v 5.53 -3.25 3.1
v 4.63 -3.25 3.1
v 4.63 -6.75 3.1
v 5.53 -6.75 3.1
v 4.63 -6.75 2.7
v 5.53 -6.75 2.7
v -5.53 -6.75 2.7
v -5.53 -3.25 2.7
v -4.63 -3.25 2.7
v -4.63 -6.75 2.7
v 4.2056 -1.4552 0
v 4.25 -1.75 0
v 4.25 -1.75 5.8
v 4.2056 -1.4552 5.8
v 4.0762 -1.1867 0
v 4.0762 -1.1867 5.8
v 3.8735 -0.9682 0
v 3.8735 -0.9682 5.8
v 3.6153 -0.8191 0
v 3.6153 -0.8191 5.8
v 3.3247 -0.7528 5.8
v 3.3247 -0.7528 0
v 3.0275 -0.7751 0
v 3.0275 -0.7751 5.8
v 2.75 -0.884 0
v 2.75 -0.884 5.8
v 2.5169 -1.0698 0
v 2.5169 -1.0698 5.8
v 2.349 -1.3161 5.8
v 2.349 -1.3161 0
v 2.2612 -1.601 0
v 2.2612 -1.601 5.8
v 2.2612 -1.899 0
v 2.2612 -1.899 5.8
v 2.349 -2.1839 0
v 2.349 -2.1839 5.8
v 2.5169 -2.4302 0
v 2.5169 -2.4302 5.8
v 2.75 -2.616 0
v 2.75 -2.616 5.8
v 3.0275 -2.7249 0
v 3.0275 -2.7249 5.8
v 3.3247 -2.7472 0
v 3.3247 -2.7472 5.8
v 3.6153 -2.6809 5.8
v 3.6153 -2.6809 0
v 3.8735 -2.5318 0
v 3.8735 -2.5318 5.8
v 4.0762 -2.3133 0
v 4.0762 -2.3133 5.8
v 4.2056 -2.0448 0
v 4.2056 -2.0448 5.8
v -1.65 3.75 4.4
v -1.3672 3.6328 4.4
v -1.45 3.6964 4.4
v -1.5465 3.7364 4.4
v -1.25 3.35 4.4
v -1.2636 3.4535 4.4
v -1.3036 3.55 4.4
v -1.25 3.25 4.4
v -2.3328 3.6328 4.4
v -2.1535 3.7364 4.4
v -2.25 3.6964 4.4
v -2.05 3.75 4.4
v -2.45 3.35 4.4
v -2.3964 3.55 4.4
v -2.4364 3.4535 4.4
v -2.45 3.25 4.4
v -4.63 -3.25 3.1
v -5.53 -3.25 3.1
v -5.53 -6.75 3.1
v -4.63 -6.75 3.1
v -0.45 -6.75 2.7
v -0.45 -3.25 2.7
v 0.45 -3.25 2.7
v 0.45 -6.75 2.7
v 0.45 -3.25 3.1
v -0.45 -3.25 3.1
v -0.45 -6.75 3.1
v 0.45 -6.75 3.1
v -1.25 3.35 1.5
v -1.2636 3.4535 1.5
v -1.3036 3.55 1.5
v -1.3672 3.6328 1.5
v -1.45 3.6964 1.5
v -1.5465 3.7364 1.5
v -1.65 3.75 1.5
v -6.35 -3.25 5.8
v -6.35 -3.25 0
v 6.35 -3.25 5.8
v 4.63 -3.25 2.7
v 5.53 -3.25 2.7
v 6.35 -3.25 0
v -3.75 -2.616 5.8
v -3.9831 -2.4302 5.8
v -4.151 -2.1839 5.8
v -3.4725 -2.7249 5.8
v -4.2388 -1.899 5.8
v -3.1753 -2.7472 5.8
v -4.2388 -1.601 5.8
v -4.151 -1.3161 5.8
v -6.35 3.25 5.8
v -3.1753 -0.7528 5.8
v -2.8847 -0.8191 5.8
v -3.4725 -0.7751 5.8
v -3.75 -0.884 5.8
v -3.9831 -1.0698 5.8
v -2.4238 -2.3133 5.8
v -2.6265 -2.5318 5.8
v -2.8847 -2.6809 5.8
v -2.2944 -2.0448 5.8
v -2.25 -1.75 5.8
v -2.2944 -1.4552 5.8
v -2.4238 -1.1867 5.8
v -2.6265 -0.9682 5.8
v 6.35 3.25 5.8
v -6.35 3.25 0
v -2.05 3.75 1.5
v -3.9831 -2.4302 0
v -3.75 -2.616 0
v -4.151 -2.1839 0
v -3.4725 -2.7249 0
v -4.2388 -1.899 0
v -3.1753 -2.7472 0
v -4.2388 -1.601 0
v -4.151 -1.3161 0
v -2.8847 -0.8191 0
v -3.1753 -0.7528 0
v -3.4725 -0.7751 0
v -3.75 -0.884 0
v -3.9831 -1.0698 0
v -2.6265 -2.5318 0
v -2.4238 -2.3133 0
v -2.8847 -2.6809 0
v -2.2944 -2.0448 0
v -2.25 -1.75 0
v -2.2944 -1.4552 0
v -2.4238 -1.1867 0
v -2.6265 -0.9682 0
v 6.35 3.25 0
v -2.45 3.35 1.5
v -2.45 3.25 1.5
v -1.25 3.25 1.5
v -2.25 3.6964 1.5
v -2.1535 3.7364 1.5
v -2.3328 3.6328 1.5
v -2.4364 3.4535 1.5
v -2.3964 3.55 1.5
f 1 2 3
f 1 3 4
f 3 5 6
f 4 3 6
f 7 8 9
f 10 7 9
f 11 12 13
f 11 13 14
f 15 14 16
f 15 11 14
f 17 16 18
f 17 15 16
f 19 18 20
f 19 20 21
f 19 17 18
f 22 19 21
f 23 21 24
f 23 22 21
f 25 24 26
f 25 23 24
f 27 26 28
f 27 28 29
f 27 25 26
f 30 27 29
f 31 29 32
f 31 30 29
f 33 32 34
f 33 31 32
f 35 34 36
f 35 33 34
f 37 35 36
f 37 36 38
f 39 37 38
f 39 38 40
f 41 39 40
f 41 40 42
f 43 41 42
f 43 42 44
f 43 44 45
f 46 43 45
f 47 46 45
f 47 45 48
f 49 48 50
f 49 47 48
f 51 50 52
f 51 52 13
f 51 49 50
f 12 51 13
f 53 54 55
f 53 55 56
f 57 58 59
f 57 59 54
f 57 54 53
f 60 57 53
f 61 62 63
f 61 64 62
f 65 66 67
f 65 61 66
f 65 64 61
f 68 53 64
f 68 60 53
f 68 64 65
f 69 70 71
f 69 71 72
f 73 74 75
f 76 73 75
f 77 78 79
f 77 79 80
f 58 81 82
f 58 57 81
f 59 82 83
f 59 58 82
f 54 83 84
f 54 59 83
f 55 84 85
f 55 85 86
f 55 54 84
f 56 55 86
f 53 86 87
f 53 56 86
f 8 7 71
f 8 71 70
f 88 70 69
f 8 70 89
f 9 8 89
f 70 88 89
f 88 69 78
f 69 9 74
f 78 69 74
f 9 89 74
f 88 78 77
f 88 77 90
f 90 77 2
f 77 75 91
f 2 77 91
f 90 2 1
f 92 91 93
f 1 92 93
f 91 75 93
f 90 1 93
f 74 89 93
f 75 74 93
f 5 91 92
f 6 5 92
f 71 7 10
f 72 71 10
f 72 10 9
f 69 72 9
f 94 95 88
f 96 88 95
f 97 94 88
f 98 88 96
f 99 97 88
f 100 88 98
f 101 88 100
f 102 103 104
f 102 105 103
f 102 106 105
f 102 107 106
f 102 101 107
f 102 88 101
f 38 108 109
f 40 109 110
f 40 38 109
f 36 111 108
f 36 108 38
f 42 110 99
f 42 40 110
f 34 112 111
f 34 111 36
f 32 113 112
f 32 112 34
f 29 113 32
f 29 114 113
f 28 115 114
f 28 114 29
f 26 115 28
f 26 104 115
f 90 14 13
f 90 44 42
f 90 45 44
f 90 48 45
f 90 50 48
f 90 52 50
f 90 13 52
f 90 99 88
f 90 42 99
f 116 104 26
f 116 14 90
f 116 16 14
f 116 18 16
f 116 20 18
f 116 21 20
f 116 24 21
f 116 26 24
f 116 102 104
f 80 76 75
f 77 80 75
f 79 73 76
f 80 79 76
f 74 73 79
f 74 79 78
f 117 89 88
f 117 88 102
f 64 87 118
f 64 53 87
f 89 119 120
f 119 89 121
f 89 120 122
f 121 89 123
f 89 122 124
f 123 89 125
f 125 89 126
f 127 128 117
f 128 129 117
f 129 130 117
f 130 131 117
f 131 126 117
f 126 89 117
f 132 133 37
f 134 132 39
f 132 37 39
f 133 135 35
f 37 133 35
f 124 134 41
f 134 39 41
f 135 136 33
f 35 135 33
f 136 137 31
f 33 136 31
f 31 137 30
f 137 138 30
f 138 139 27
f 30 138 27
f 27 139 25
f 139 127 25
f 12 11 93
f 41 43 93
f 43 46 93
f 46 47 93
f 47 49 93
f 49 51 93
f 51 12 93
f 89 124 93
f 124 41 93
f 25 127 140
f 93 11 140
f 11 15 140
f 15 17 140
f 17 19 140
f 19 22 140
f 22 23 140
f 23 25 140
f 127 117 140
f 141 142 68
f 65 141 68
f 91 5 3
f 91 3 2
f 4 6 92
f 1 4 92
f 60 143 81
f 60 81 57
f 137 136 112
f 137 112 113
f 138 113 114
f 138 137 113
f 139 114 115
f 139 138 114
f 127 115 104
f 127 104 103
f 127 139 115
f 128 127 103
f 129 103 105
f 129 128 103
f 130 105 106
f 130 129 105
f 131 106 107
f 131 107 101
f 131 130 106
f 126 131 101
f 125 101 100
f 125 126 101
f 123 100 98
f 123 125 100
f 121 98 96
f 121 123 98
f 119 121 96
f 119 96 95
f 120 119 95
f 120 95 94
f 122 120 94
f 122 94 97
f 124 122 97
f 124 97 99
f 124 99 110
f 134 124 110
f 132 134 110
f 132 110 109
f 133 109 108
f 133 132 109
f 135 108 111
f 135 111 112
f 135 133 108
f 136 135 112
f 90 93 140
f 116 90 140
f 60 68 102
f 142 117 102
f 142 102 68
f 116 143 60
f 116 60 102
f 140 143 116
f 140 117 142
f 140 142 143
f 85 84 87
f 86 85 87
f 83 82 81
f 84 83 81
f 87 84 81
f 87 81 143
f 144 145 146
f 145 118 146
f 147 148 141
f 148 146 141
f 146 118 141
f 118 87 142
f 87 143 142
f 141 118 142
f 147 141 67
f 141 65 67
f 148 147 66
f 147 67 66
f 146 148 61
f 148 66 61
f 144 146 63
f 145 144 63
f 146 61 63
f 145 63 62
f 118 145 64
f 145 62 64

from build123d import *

# Parameters (mm, degrees)
F0_W     = 12.7
F0_H     = 6.5
F0_R     = 1
F1_DEPTH = 5.8
F4_W     = 0.9
F4_H     = 3.5
F5_DEPTH = 0.4
F2_W     = 1.2
F2_H     = 2.9
F6_DEPTH = 0.5
F7_R     = 0.4


with BuildPart() as f1:
    # F0 (on Top) → F1 (new body)
    with BuildSketch(Plane.XY):
        Rectangle(F0_W, F0_H)
        with Locations((-3.25, -1.75)):
            Circle(F0_R, mode=Mode.SUBTRACT)
        with Locations((3.25, -1.75)):
            Circle(F0_R, mode=Mode.SUBTRACT)
    extrude(amount=F1_DEPTH)

    # F4 (on offset) → F5 (join)
    with BuildSketch(Plane.XY.offset(2.7)):
        with Locations((-5.08, -5)):
            Rectangle(F4_W, F4_H)
        with Locations((0, -5)):
            Rectangle(F4_W, F4_H)
        with Locations((5.08, -5)):
            Rectangle(F4_W, F4_H)
    extrude(amount=F5_DEPTH)

    # F2 (on face) → F6 (join)
    with BuildSketch(Plane(origin=(0, 3.25, 0), x_dir=(-1, 0, 0), z_dir=(0, 1, 0))):
        with Locations((1.85, 2.95)):
            Rectangle(F2_W, F2_H)
    extrude(amount=F6_DEPTH)

    # F7
    f7_edges = [f1.edges().sort_by_distance(p)[0] for p in [
        (-2.45, 3.75, 2.95),
        (-1.25, 3.75, 2.95),
    ]]
    fillet(f7_edges, radius=F7_R)


solid = f1.part
